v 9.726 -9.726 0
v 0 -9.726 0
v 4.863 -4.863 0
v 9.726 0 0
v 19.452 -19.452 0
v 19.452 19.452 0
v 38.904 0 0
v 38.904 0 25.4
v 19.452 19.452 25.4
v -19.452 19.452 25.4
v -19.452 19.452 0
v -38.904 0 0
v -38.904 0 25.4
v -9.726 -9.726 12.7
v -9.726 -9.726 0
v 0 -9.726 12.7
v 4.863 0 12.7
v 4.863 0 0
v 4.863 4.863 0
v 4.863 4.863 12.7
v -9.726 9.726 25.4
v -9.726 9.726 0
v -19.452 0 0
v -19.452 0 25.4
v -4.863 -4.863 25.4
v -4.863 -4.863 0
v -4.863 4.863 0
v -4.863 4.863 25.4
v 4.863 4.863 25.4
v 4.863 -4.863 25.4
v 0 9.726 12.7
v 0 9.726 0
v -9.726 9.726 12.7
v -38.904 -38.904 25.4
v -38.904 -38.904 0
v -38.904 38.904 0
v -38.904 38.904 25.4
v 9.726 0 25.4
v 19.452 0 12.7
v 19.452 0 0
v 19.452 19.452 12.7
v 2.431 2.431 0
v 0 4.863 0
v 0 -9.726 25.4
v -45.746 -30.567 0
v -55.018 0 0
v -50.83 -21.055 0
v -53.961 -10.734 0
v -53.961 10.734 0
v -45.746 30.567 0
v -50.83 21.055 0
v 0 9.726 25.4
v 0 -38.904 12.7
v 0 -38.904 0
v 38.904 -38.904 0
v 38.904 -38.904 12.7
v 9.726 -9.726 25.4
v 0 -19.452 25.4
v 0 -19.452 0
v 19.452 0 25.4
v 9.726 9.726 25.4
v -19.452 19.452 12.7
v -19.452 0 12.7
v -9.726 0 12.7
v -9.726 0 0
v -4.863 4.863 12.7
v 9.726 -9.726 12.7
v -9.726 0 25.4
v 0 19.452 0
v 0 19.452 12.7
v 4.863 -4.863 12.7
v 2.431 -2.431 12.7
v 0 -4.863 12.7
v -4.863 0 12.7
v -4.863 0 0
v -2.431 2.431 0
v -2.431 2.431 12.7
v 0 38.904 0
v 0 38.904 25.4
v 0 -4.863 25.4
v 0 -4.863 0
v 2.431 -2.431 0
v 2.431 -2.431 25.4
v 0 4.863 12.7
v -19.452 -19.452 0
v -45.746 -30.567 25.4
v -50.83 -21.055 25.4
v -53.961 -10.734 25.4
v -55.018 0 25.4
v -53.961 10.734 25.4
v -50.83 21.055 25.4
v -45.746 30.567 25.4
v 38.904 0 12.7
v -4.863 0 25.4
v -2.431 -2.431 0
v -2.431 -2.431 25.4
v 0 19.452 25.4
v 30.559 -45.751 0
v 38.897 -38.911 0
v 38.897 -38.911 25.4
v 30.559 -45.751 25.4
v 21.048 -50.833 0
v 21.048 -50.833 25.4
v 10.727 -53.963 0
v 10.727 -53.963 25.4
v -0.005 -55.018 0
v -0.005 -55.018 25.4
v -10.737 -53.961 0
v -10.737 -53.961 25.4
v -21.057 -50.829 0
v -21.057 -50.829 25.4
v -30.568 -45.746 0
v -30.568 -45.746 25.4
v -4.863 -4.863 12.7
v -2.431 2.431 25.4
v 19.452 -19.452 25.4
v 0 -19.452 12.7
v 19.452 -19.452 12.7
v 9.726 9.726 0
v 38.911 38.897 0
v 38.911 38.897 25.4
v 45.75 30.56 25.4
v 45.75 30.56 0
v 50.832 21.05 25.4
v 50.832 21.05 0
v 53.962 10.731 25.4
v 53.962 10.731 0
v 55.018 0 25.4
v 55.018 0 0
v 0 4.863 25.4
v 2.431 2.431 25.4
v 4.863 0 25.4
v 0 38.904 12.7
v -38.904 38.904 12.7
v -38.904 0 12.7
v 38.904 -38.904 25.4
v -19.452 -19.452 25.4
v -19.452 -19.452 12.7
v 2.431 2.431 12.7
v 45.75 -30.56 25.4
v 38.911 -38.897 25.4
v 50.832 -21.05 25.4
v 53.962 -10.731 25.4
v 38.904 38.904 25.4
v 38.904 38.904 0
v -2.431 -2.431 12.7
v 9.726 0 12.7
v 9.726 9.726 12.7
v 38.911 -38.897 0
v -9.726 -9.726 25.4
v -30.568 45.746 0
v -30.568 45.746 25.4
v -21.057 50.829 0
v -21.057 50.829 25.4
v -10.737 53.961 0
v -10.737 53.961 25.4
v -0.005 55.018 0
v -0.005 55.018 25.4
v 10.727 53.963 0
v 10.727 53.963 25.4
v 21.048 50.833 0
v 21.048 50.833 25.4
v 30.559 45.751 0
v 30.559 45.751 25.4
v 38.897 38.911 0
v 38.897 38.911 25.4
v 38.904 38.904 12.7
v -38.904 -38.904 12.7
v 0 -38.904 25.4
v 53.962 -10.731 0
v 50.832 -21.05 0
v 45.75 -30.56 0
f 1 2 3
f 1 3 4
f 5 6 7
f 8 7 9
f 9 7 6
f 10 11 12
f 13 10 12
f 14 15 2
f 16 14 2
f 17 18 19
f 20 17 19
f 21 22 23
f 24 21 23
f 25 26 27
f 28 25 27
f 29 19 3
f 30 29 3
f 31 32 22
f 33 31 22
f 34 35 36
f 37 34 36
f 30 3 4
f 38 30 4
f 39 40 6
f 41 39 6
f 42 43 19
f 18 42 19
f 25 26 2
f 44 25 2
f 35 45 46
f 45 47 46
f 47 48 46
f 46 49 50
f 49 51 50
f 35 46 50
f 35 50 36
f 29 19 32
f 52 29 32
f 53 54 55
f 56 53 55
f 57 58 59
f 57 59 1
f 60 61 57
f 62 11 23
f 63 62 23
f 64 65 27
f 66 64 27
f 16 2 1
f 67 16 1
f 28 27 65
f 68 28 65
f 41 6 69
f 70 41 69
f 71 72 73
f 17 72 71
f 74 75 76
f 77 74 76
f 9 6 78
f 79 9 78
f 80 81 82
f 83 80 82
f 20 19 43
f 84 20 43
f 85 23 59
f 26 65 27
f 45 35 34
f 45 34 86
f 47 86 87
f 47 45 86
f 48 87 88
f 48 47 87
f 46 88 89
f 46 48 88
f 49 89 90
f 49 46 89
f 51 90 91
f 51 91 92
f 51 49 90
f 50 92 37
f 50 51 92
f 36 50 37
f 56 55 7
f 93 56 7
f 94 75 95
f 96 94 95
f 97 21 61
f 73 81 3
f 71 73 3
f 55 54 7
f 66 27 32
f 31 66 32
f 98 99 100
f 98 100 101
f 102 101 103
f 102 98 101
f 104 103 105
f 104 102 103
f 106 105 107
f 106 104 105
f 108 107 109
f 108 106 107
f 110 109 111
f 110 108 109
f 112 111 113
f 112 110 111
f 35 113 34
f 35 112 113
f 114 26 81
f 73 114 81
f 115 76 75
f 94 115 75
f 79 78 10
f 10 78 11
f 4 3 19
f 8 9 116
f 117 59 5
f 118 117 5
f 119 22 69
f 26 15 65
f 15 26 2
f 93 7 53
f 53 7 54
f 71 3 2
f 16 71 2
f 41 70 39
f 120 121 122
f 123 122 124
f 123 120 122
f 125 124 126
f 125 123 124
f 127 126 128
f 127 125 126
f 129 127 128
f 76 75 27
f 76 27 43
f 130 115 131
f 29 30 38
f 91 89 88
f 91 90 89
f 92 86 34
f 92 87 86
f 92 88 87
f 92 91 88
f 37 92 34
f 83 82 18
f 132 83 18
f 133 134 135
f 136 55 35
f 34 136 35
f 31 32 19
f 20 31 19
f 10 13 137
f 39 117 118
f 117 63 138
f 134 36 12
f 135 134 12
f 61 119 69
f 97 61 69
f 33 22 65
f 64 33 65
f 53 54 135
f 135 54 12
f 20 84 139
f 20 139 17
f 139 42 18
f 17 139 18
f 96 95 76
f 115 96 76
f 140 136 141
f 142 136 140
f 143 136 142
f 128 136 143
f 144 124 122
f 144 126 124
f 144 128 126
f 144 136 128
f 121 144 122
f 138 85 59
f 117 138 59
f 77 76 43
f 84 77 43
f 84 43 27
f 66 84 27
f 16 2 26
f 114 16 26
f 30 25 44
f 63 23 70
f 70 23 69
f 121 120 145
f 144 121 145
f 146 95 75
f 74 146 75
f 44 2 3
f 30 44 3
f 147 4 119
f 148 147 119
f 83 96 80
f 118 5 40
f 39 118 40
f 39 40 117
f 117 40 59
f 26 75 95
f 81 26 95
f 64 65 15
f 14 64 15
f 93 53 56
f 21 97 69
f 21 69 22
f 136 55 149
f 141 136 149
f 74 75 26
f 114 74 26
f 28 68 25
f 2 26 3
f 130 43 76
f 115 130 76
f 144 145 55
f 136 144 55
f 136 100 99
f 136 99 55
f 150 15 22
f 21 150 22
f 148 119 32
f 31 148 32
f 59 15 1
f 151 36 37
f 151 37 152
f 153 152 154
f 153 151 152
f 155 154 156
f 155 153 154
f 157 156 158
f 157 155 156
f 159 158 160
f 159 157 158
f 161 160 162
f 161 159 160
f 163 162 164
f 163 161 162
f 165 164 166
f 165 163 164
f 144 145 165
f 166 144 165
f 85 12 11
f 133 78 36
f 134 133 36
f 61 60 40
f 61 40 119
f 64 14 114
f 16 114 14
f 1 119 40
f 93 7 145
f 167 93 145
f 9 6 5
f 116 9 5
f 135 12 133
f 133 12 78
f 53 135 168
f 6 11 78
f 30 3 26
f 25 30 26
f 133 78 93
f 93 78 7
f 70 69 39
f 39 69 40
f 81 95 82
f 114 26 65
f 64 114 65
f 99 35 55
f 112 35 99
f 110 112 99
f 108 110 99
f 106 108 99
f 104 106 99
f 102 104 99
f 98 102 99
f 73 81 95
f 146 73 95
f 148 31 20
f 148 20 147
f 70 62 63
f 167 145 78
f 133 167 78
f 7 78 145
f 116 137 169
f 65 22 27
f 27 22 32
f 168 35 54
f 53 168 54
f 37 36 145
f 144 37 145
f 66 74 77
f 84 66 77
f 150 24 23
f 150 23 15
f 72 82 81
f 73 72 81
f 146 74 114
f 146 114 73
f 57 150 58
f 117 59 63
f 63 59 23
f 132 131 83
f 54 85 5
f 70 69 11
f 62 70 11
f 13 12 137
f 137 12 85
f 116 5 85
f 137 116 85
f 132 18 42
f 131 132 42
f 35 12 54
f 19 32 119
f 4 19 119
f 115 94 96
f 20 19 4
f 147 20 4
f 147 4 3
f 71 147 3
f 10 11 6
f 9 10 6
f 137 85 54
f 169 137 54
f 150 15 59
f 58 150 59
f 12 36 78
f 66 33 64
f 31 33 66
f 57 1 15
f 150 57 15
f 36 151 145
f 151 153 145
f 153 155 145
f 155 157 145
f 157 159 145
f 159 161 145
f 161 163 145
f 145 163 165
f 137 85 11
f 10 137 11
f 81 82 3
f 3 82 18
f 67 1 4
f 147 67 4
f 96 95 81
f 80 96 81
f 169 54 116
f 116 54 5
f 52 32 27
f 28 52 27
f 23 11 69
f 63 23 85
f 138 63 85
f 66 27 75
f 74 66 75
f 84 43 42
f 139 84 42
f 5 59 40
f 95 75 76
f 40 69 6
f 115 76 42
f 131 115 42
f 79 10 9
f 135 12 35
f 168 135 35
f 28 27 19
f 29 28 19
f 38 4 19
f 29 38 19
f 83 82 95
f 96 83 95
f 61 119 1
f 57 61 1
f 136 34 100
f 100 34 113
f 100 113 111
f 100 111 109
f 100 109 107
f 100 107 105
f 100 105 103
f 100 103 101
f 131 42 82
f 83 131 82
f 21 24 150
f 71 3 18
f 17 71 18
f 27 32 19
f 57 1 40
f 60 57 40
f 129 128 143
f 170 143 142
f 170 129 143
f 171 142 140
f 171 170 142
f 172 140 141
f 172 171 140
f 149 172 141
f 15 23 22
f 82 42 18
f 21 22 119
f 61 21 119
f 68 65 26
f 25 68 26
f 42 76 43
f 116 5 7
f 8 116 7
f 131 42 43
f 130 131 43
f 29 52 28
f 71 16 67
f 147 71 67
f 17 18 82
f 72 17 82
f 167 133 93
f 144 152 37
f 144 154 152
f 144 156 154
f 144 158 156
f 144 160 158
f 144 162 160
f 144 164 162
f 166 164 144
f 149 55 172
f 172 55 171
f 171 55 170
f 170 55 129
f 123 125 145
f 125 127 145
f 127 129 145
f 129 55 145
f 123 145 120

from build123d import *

# Parameters (mm, degrees)
F1_DEPTH  = 25.4
F2_DEPTH  = 12.7
F3_DEPTH  = 25.4
F4_DEPTH  = 12.7
F5_DEPTH  = 25.4
F6_DEPTH  = 12.7
F7_DEPTH  = 25.4
F8_DEPTH  = 12.7
F9_DEPTH  = 25.4
F11_DEPTH = 77.9


with BuildPart() as f1:
    # F0 (on Top) → F1 (new body)
    with BuildSketch(Plane.XY):
        Polygon((38.90394, 38.90394), (0, 77.807881), (-38.90394, 38.90394), (0, 38.90394), align=None)
        Polygon((-38.90394, 0), (-38.90394, 38.90394), (-77.807881, 0), (-38.90394, -38.90394), align=None)
        Polygon((0, -38.90394), (-38.90394, -38.90394), (0, -77.807881), (38.90394, -38.90394), align=None)
        Polygon((77.807881, 0), (38.90394, 38.90394), (38.90394, 0), (38.90394, -38.90394), align=None)
    extrude(amount=F1_DEPTH)


with BuildPart() as f2:
    # F0 (on Top) → F2 (new body)
    with BuildSketch(Plane.XY):
        Polygon((0, 38.90394), (-38.90394, 38.90394), (-38.90394, 0), (-19.45197, 19.45197), align=None)
        Polygon((-19.45197, -19.45197), (-38.90394, 0), (-38.90394, -38.90394), (0, -38.90394), align=None)
        Polygon((38.90394, -38.90394), (38.90394, 0), (19.45197, -19.45197), (0, -38.90394), align=None)
        Polygon((38.90394, 0), (38.90394, 38.90394), (0, 38.90394), (19.45197, 19.45197), align=None)
    extrude(amount=F2_DEPTH)


with BuildPart() as f3:
    # F0 (on Top) → F3 (new body)
    with BuildSketch(Plane.XY):
        Polygon((19.45197, 19.45197), (0, 38.90394), (-19.45197, 19.45197), (0, 19.45197), align=None)
        Polygon((-19.45197, 19.45197), (-38.90394, 0), (-19.45197, -19.45197), (-19.45197, 0), align=None)
        Polygon((19.45197, -19.45197), (38.90394, 0), (19.45197, 19.45197), (19.45197, 0), align=None)
        Polygon((0, -19.45197), (-19.45197, -19.45197), (0, -38.90394), (19.45197, -19.45197), align=None)
    extrude(amount=F3_DEPTH)


with BuildPart() as f4:
    # F0 (on Top) → F4 (new body)
    with BuildSketch(Plane.XY):
        Polygon((0, 19.45197), (-19.45197, 19.45197), (-19.45197, 0), (-9.725985, 9.725985), align=None)
        Polygon((-19.45197, 0), (-19.45197, -19.45197), (0, -19.45197), (-9.725985, -9.725985), align=None)
        Polygon((0, -19.45197), (19.45197, -19.45197), (19.45197, 0), (9.725985, -9.725985), align=None)
        Polygon((19.45197, 0), (19.45197, 19.45197), (0, 19.45197), (9.725985, 9.725985), align=None)
    extrude(amount=F4_DEPTH)


with BuildPart() as f5:
    # F0 (on Top) → F5 (new body)
    with BuildSketch(Plane.XY):
        Polygon((9.725985, 9.725985), (0, 19.45197), (-9.725985, 9.725985), (0, 9.725985), align=None)
        Polygon((-9.725985, 9.725985), (-19.45197, 0), (-9.725985, -9.725985), (-9.725985, 0), align=None)
        Polygon((9.725985, -9.725985), (19.45197, 0), (9.725985, 9.725985), (9.725985, 0), align=None)
        Polygon((-9.725985, -9.725985), (0, -19.45197), (9.725985, -9.725985), (0, -9.725985), align=None)
    extrude(amount=F5_DEPTH)


with BuildPart() as f6:
    # F0 (on Top) → F6 (new body)
    with BuildSketch(Plane.XY):
        Polygon((0, 9.725985), (-9.725985, 9.725985), (-9.725985, 0), (-4.862993, 4.862993), align=None)
        Polygon((-9.725985, 0), (-9.725985, -9.725985), (0, -9.725985), (-4.862993, -4.862993), align=None)
        Polygon((0, -9.725985), (9.725985, -9.725985), (9.725985, 0), (4.862993, -4.862993), align=None)
        Polygon((9.725985, 0), (9.725985, 9.725985), (0, 9.725985), (4.862993, 4.862993), align=None)
    extrude(amount=F6_DEPTH)


with BuildPart() as f7:
    # F0 (on Top) → F7 (new body)
    with BuildSketch(Plane.XY):
        Polygon((4.862993, 4.862993), (0, 9.725985), (-4.862993, 4.862993), (0, 4.862993), align=None)
        Polygon((-4.862993, 4.862993), (-9.725985, 0), (-4.862993, -4.862993), (-4.862993, 0), align=None)
        Polygon((-4.862993, -4.862993), (0, -9.725985), (4.862993, -4.862993), (0, -4.862993), align=None)
        Polygon((4.862993, -4.862993), (9.725985, 0), (4.862993, 4.862993), (4.862993, 0), align=None)
    extrude(amount=F7_DEPTH)


with BuildPart() as f8:
    # F0 (on Top) → F8 (new body)
    with BuildSketch(Plane.XY):
        Polygon((0, 4.862993), (-4.862993, 4.862993), (-4.862993, 0), (-2.431496, 2.431496), align=None)
        Polygon((-4.862993, 0), (-4.862993, -4.862993), (0, -4.862993), (-2.431496, -2.431496), align=None)
        Polygon((0, -4.862993), (4.862993, -4.862993), (4.862993, 0), (2.431496, -2.431496), align=None)
        Polygon((4.862993, 0), (4.862993, 4.862993), (0, 4.862993), (2.431496, 2.431496), align=None)
    extrude(amount=F8_DEPTH)


with BuildPart() as f9:
    # F0 (on Top) → F9 (new body)
    with BuildSketch(Plane.XY):
        Polygon((2.431496, 2.431496), (0, 4.862993), (-2.431496, 2.431496), align=None)
        Polygon((-2.431496, 2.431496), (-4.862993, 0), (-2.431496, -2.431496), align=None)
        Polygon((-2.431496, -2.431496), (0, -4.862993), (2.431496, -2.431496), align=None)
        Polygon((2.431496, -2.431496), (4.862993, 0), (2.431496, 2.431496), align=None)
    extrude(amount=F9_DEPTH)


with BuildPart() as f11_tool:
    # F10 (on face) → F11 (new body)
    with BuildSketch(Plane(origin=(0, 0, 0), x_dir=(1, 0, 0), z_dir=(0, 0, -1))):
        with BuildLine():
            Line((-38.90394, -38.90394), (-38.90394, 38.90394))
            ThreePointArc((-38.90394, 38.90394), (-55.01848, 0), (-38.90394, -38.90394))
        make_face()
        with BuildLine():
            ThreePointArc((-38.90394, -38.90394), (21.054661, -50.830448), (55.01848, 0))
            ThreePointArc((55.01848, 0), (21.054661, 50.830448), (-38.90394, 38.90394))
            Line((-38.90394, 38.90394), (-38.90394, -38.90394))
        make_face()
    extrude(amount=-F11_DEPTH)


with BuildPart() as f1_1:
    add(f1.part)

    # F11: intersect by f11_tool
    add(f11_tool.part, mode=Mode.INTERSECT)


with BuildPart() as f2_1:
    add(f2.part)

    # F11: intersect by f11_tool
    add(f11_tool.part, mode=Mode.INTERSECT)


with BuildPart() as f3_1:
    add(f3.part)

    # F11: intersect by f11_tool
    add(f11_tool.part, mode=Mode.INTERSECT)


with BuildPart() as f4_1:
    add(f4.part)

    # F11: intersect by f11_tool
    add(f11_tool.part, mode=Mode.INTERSECT)


with BuildPart() as f5_1:
    add(f5.part)

    # F11: intersect by f11_tool
    add(f11_tool.part, mode=Mode.INTERSECT)


with BuildPart() as f6_1:
    add(f6.part)

    # F11: intersect by f11_tool
    add(f11_tool.part, mode=Mode.INTERSECT)


with BuildPart() as f7_1:
    add(f7.part)

    # F11: intersect by f11_tool
    add(f11_tool.part, mode=Mode.INTERSECT)


with BuildPart() as f8_1:
    add(f8.part)

    # F11: intersect by f11_tool
    add(f11_tool.part, mode=Mode.INTERSECT)


with BuildPart() as f9_1:
    add(f9.part)

    # F11: intersect by f11_tool
    add(f11_tool.part, mode=Mode.INTERSECT)


solid = Compound([f1_1.part, f2_1.part, f3_1.part, f4_1.part, f5_1.part, f6_1.part, f7_1.part, f8_1.part, f9_1.part])
